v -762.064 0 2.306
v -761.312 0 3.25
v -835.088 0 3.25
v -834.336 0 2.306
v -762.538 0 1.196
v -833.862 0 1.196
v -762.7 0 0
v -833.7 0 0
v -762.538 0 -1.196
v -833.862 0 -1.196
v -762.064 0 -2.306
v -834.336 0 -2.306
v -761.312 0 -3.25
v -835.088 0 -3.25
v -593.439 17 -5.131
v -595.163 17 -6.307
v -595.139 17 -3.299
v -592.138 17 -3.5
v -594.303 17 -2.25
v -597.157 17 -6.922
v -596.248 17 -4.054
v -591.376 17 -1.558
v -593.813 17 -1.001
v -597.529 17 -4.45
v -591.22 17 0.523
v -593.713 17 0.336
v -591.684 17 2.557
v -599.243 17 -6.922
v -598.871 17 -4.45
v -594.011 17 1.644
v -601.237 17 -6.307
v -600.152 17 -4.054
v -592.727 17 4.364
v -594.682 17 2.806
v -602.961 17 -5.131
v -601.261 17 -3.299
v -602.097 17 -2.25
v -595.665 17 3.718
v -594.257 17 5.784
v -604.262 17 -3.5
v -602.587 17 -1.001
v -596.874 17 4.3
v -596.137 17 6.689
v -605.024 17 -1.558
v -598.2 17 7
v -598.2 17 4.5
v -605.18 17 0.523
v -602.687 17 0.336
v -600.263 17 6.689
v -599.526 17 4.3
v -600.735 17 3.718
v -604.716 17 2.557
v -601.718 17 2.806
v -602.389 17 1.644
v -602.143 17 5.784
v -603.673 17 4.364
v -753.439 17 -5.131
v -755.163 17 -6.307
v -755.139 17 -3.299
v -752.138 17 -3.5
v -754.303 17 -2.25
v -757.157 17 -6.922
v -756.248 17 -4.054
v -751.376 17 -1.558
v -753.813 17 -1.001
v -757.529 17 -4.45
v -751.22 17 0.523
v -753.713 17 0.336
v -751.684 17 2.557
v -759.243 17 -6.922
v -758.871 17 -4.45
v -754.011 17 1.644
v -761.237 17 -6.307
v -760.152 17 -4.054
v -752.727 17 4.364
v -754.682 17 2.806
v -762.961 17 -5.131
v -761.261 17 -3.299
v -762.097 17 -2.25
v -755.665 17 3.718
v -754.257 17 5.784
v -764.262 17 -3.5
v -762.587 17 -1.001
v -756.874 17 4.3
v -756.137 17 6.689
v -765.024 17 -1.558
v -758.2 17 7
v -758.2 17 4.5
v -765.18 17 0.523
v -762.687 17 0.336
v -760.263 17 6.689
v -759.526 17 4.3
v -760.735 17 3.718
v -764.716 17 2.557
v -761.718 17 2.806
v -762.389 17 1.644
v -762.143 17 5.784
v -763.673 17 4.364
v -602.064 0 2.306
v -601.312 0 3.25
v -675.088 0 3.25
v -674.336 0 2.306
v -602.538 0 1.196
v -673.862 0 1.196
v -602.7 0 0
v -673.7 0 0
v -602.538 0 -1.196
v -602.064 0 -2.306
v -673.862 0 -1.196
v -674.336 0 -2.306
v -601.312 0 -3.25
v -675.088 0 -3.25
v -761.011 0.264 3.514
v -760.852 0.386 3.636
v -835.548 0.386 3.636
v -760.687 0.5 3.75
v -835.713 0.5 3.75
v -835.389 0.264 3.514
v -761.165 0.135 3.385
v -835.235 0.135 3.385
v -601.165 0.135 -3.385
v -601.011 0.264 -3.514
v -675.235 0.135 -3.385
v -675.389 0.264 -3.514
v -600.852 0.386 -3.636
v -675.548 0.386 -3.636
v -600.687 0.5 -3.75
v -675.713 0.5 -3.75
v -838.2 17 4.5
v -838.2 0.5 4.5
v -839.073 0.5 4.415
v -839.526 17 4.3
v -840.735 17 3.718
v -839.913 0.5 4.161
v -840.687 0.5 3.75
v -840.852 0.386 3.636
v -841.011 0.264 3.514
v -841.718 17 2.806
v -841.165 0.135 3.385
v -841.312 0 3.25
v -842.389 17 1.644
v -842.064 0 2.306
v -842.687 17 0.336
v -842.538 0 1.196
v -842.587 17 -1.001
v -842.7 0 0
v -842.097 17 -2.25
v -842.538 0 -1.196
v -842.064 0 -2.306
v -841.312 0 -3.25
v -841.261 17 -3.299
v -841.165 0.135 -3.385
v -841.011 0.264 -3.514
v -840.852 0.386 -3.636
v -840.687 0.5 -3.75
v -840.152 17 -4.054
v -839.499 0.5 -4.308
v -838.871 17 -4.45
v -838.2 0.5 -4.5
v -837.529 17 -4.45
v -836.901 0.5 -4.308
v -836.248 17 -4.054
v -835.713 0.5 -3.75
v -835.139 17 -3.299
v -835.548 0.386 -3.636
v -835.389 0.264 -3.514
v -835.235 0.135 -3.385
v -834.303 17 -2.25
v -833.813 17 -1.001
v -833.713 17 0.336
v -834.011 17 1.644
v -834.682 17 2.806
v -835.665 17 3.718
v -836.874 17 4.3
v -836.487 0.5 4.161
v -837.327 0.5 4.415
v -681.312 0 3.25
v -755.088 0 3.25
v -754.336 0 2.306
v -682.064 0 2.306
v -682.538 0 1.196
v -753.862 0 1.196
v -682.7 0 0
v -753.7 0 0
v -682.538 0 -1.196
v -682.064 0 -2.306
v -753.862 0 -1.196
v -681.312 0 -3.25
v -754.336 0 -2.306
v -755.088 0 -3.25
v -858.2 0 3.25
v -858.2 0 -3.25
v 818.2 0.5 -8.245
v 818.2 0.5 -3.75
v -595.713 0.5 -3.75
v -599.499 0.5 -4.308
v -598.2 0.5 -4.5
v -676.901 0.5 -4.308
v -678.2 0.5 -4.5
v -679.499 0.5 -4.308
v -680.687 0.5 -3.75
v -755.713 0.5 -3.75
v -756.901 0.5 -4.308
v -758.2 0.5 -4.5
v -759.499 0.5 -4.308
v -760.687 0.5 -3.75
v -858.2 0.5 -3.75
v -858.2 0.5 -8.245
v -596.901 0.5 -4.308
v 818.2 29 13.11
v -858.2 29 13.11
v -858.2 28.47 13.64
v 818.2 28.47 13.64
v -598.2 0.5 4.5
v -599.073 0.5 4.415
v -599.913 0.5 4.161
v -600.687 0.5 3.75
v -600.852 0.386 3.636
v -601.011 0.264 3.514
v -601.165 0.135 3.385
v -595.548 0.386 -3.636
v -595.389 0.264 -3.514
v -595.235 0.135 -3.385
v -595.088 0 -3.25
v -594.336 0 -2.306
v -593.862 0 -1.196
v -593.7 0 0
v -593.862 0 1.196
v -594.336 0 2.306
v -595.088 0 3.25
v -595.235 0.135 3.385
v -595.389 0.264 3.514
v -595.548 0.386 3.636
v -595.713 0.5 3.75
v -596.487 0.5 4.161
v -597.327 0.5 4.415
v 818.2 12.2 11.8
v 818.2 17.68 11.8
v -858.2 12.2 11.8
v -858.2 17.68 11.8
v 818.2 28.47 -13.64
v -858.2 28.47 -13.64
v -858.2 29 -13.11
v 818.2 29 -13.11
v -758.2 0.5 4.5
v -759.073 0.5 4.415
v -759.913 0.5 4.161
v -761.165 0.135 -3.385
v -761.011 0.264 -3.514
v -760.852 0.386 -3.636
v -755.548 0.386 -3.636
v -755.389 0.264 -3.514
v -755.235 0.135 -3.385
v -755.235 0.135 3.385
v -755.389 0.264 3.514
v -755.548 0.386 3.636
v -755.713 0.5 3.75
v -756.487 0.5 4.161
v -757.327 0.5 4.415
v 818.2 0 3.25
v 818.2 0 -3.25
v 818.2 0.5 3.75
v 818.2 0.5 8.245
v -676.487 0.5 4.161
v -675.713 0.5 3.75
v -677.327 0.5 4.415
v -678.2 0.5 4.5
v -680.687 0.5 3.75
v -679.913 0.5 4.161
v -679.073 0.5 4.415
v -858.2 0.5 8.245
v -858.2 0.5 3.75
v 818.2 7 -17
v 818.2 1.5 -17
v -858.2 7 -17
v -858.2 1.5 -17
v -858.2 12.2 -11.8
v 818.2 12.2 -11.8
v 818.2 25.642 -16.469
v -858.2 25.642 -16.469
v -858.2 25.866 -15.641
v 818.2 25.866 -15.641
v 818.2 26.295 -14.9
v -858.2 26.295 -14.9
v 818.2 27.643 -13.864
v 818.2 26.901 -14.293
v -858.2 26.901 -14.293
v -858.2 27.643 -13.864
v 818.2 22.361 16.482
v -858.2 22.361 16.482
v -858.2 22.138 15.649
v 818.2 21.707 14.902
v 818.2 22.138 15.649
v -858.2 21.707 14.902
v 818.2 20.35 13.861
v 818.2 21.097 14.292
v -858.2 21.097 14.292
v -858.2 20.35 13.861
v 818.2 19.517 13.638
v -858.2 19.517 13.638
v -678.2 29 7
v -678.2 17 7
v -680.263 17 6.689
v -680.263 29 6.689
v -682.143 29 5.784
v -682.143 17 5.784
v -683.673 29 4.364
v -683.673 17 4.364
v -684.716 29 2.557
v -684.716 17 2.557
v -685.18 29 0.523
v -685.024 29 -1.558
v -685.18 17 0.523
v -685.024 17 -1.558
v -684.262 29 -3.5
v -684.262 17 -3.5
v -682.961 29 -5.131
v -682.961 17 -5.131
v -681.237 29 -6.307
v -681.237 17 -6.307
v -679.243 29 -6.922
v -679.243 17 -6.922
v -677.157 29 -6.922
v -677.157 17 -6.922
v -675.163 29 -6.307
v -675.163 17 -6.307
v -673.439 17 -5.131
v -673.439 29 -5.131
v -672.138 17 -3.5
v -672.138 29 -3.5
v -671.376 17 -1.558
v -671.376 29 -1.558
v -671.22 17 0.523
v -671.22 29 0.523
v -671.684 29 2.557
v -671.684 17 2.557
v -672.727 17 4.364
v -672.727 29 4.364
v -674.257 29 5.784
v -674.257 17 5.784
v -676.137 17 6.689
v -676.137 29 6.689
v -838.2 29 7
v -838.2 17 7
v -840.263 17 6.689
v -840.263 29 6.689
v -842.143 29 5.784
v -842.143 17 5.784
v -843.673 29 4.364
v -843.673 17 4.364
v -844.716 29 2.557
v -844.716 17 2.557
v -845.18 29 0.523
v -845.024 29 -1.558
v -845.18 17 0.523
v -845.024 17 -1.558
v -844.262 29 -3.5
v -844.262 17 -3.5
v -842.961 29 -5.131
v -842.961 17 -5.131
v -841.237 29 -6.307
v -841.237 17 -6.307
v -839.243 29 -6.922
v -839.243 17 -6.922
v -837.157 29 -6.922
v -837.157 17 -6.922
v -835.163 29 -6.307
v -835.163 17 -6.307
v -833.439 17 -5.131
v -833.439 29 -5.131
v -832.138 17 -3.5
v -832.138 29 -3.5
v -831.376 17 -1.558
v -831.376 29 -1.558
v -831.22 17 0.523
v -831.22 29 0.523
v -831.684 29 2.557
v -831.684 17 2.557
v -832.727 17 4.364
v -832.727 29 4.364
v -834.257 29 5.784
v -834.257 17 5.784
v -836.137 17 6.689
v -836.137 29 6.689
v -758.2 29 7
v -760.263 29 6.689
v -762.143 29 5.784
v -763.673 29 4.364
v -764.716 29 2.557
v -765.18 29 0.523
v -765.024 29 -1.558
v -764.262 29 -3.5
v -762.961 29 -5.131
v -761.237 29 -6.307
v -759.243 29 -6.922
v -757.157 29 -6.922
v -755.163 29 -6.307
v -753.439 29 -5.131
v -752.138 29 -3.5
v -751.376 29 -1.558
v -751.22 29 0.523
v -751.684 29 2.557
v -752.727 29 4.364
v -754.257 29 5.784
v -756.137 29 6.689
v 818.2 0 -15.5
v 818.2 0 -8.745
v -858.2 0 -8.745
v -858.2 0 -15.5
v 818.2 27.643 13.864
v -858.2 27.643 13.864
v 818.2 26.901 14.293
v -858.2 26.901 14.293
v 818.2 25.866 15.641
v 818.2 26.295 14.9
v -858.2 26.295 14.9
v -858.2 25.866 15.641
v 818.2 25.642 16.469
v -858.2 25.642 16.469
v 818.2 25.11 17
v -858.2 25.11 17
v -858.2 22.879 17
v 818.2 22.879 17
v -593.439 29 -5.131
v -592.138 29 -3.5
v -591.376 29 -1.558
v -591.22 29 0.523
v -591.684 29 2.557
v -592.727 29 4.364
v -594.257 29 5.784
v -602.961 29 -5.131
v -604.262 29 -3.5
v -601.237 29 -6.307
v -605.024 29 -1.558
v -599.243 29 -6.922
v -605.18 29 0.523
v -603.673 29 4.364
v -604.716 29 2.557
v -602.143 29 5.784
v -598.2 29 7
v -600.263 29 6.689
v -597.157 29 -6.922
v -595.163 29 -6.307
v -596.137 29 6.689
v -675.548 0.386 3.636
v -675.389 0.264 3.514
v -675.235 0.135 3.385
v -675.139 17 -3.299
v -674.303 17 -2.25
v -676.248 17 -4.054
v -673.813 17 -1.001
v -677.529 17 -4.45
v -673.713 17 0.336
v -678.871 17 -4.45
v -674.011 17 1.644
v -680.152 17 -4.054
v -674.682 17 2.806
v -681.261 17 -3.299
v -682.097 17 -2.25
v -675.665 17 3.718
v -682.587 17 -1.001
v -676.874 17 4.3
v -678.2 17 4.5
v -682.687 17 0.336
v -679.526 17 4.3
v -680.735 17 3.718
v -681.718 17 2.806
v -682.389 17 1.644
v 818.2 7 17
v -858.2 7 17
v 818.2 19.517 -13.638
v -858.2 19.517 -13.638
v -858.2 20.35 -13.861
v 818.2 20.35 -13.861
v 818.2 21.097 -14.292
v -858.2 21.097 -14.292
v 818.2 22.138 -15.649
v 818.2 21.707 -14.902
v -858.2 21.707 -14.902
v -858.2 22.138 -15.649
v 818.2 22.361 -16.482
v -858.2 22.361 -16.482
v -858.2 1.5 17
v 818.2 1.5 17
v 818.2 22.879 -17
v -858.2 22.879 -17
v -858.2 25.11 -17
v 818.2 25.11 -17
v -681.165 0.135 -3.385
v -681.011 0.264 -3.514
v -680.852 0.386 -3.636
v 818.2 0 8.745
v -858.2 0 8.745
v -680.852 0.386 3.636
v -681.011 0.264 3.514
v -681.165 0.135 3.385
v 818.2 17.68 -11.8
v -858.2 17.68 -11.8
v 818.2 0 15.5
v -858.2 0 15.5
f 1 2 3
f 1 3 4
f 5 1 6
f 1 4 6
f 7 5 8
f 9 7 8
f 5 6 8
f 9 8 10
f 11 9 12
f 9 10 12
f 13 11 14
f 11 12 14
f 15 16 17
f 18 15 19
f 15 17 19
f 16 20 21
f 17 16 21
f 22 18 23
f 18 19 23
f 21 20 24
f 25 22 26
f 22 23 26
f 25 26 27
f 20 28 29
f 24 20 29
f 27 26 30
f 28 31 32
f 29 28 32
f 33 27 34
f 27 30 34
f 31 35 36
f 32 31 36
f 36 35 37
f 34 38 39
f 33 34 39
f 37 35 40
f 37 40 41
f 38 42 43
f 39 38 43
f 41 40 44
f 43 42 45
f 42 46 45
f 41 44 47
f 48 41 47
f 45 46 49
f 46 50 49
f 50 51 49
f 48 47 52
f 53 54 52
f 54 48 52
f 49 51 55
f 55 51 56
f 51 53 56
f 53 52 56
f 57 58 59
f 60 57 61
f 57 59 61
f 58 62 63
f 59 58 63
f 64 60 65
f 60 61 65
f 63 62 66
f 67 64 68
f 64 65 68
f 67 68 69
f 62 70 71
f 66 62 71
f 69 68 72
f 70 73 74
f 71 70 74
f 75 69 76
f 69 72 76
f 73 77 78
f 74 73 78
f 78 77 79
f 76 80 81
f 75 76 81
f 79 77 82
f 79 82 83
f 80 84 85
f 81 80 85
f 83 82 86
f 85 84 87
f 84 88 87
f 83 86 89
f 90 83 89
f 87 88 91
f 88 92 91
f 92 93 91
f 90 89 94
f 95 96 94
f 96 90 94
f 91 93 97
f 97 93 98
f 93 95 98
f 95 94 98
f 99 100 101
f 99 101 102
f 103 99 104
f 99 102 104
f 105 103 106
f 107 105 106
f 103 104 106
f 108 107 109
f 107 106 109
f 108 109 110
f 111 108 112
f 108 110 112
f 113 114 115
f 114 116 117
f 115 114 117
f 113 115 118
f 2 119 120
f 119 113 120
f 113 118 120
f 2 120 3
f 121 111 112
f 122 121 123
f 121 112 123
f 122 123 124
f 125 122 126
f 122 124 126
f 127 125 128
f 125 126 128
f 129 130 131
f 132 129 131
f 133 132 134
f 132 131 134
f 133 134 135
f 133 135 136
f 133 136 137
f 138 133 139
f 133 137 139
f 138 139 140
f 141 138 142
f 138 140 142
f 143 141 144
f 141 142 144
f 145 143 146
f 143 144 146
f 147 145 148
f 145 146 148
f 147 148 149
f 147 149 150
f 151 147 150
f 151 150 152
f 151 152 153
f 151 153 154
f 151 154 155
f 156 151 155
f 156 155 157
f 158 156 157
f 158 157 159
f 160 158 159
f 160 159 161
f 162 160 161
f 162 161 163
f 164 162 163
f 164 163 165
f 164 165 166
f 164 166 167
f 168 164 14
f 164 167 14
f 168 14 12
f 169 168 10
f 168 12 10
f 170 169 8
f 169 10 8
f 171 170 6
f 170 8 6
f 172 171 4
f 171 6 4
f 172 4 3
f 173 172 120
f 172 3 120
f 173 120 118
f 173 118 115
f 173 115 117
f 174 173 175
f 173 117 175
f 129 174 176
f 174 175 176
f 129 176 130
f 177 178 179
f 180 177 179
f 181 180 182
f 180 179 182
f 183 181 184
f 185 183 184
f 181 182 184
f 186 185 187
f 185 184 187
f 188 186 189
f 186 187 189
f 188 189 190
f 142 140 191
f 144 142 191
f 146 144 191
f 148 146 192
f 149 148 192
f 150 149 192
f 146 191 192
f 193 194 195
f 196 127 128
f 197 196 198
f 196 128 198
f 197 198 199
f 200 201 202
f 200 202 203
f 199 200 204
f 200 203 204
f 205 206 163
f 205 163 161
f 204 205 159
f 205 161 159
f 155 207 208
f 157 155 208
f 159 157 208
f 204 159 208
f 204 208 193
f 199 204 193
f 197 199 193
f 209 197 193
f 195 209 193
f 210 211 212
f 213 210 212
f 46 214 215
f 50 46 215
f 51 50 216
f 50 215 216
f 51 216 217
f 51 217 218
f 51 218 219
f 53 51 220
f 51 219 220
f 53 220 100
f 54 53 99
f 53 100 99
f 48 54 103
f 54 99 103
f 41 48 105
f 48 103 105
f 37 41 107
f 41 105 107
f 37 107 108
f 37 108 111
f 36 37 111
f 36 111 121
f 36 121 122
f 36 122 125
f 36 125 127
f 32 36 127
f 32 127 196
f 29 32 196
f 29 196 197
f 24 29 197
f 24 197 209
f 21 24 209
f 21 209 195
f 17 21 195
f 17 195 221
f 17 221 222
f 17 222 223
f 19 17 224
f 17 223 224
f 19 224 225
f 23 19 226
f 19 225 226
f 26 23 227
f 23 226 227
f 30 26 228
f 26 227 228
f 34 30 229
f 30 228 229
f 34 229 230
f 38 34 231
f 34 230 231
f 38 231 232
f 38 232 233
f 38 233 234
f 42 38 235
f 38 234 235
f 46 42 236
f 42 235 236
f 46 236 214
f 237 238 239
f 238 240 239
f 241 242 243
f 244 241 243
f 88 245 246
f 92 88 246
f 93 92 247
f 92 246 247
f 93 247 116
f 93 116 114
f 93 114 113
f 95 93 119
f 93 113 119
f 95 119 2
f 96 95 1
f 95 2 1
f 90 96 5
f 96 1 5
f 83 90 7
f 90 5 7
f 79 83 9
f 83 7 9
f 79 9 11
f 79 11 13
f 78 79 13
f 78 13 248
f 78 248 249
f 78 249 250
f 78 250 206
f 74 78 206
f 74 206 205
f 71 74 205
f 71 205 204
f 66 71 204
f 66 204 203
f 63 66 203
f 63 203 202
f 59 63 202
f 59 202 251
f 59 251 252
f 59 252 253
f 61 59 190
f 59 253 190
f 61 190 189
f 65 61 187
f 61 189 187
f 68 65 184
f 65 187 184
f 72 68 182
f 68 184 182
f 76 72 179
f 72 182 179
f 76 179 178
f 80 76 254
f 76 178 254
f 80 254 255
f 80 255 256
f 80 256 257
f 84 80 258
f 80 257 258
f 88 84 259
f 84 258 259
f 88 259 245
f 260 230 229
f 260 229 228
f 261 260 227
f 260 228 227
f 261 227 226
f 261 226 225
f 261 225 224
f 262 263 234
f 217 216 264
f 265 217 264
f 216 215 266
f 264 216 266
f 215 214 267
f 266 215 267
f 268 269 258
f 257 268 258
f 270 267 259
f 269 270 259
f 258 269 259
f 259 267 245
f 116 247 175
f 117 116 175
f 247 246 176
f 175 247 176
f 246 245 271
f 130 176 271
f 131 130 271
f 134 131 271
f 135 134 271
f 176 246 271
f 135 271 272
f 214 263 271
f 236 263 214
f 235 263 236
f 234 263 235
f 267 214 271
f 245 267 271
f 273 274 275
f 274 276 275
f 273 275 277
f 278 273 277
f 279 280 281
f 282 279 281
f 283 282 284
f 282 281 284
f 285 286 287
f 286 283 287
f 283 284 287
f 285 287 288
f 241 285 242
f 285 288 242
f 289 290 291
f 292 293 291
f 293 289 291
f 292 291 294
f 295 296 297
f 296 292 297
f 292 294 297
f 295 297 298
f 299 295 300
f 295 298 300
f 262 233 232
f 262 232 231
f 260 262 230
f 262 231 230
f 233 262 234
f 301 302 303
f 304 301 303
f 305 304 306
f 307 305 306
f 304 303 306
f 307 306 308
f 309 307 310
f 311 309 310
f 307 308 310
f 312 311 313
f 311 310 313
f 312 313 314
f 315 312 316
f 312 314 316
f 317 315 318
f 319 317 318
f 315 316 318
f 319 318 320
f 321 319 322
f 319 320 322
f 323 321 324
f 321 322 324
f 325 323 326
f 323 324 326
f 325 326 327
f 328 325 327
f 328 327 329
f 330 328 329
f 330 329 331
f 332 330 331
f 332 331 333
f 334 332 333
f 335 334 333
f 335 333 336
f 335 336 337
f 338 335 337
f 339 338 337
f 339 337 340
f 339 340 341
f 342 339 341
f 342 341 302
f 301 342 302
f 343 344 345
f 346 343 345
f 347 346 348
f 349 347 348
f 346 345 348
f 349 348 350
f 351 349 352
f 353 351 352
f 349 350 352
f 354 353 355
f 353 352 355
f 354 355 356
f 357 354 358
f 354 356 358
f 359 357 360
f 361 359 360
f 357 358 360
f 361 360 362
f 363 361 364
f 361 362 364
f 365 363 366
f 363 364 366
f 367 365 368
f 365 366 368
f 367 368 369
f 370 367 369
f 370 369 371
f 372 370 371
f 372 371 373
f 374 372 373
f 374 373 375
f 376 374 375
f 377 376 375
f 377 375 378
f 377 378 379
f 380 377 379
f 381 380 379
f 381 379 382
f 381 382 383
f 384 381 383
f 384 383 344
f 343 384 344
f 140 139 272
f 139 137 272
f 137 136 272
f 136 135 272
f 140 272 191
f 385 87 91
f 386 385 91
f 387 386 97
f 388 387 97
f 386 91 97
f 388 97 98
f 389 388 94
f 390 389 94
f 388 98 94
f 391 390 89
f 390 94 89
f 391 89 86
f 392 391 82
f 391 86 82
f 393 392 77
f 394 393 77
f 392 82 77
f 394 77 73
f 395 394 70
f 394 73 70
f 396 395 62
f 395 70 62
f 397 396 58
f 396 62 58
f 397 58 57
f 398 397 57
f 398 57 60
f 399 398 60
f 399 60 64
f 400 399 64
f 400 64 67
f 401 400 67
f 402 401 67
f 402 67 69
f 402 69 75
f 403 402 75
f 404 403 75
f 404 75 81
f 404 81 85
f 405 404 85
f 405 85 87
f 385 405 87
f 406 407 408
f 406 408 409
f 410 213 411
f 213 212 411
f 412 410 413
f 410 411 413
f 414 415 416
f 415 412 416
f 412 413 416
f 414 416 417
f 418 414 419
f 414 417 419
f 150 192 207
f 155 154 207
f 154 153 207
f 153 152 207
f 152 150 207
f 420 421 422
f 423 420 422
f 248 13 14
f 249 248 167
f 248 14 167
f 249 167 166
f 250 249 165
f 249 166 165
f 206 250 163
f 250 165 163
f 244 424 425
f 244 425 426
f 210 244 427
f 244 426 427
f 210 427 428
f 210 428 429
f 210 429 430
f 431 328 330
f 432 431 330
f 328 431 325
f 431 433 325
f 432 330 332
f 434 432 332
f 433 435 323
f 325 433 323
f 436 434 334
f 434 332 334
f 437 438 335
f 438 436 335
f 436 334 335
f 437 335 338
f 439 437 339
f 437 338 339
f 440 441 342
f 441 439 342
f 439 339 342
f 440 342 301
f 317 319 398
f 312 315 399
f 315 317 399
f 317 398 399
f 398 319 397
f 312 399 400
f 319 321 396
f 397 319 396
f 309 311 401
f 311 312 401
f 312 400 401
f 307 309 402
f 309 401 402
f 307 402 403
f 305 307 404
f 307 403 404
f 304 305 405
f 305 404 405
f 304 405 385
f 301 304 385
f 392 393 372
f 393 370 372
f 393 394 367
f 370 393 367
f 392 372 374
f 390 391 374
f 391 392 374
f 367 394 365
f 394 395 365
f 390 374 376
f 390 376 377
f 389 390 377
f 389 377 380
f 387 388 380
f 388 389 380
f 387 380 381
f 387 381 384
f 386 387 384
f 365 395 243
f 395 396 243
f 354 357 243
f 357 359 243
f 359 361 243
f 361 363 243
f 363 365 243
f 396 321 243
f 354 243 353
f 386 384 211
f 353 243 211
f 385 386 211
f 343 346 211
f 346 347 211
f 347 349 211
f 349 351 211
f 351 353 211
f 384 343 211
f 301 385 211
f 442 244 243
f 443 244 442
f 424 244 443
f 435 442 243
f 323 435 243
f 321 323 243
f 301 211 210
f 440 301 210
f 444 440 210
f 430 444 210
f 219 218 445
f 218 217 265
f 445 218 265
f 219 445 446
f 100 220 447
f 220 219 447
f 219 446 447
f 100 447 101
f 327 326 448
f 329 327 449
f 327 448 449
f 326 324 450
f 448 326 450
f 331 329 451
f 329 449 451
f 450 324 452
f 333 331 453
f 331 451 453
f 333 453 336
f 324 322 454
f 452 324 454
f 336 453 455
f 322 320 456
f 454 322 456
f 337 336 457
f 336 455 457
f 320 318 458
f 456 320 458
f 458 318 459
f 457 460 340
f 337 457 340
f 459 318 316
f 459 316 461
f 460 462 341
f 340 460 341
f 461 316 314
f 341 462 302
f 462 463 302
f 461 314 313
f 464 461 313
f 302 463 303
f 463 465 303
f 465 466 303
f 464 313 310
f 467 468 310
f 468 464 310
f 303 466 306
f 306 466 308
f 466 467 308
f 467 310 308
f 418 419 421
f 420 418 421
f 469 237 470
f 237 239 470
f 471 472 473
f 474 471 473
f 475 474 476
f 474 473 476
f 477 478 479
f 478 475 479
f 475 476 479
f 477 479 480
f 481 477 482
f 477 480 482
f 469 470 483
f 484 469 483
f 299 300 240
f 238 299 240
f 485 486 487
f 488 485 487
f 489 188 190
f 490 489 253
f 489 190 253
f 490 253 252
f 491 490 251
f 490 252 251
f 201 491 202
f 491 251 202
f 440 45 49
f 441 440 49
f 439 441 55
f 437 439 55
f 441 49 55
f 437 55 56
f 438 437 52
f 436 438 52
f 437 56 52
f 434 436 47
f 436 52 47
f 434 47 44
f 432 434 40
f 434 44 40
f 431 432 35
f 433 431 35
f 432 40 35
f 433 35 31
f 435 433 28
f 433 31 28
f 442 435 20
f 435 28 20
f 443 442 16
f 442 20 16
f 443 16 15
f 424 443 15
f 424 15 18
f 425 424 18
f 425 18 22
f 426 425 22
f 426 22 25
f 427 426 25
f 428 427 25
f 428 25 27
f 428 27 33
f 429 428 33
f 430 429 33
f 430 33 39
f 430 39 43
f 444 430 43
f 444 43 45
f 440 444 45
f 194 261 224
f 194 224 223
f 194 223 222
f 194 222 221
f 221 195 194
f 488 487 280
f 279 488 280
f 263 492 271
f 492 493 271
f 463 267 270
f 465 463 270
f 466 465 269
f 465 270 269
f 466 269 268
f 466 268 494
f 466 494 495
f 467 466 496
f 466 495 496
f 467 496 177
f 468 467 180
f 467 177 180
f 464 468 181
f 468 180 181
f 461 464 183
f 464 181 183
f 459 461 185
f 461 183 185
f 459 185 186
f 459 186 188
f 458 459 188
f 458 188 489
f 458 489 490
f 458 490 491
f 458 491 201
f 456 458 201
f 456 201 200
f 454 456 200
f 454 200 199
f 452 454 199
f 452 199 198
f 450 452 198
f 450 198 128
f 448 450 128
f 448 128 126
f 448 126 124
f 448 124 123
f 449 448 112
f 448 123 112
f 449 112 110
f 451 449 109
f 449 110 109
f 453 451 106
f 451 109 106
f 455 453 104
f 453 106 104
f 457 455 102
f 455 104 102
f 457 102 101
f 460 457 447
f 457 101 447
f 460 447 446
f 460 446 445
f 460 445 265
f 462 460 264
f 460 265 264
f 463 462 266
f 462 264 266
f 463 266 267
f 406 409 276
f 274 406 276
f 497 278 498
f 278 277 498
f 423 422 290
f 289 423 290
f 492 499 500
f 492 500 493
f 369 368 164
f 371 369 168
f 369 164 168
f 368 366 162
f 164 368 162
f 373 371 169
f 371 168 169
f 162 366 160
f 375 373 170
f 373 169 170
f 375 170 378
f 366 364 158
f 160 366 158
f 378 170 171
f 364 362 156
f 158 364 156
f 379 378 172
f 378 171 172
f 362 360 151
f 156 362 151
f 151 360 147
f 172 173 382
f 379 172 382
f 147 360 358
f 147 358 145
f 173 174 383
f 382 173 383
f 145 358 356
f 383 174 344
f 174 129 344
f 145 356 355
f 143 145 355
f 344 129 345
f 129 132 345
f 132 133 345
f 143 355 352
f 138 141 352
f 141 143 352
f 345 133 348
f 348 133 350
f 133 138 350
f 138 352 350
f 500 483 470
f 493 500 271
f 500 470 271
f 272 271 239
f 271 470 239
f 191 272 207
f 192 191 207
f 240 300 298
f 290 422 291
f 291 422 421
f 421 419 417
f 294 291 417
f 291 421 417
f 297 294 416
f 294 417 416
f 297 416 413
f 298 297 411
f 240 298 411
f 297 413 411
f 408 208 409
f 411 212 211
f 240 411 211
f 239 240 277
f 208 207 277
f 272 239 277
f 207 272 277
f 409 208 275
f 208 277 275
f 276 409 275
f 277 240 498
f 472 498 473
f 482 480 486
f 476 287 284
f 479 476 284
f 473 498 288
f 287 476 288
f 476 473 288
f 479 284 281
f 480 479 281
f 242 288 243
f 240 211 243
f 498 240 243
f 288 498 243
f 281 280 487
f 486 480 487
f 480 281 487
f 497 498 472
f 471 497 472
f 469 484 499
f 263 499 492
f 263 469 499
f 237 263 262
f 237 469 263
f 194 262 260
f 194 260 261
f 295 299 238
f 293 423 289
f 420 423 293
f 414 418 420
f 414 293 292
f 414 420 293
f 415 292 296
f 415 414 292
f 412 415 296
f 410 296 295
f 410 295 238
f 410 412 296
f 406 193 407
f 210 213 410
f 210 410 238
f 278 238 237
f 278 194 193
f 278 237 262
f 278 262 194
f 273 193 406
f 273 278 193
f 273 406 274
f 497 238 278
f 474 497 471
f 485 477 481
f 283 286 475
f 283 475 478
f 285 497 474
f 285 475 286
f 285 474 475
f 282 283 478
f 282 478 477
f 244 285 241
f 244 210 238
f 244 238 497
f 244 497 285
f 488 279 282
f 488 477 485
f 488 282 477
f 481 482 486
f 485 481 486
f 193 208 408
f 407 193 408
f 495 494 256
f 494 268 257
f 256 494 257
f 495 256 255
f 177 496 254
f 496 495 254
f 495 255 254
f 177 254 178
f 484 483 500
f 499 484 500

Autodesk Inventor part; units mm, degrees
sketch "Sketch_18" plane through (-20, 0, 0) normal (1, 0, 0) x (0, 0, -1)
  line L0 (-17, 1.5) -> (-15.5, 0)
  line L1 (-15.5, 0) -> (-8.745, 0)
  line L2 (-8.745, 0) -> (-8.245, 0.5)
  line L3 (-8.245, 0.5) -> (-3.75, 0.5)
  line L4 (-3.75, 0.5) -> (-3.25, 0)
  line L5 (-3.25, 0) -> (3.25, 0)
  line L6 (3.25, 0) -> (3.75, 0.5)
  line L7 (3.75, 0.5) -> (8.245, 0.5)
  line L8 (8.245, 0.5) -> (8.745, 0)
  line L9 (8.745, 0) -> (15.5, 0)
  line L10 (15.5, 0) -> (17, 1.5)
  line L11 (17, 1.5) -> (17, 7.0002)
  line L12 (17, 7.0002) -> (11.8003, 12.1999)
  line L13 (11.8003, 12.1999) -> (11.8003, 17.6796)
  line L14 (11.8003, 17.6796) -> (13.6381, 19.5174)
  arc A0 (16.4816, 22.3609) -> (13.6381, 19.5174) centre (16.9102, 19.0889) ccw
  line L15 (16.4816, 22.3609) -> (17, 22.8793)
  line L16 (17, 22.8793) -> (17, 25.1102)
  line L17 (17, 25.1102) -> (16.4686, 25.6415)
  arc A1 (13.6398, 28.4703) -> (16.4686, 25.6415) centre (16.9102, 28.9119) ccw
  line L18 (13.6398, 28.4703) -> (13.1102, 29)
  line L19 (13.1102, 29) -> (-13.1102, 29)
  line L20 (-13.1102, 29) -> (-13.6398, 28.4703)
  arc A2 (-16.4686, 25.6415) -> (-13.6398, 28.4703) centre (-16.9102, 28.9119) ccw
  line L21 (-16.4686, 25.6415) -> (-17, 25.1102)
  line L22 (-17, 25.1102) -> (-17, 22.8793)
  line L23 (-17, 22.8793) -> (-16.4816, 22.3609)
  arc A3 (-13.6381, 19.5174) -> (-16.4816, 22.3609) centre (-16.9102, 19.0889) ccw
  line L24 (-13.6381, 19.5174) -> (-11.8003, 17.6796)
  line L25 (-11.8003, 17.6796) -> (-11.8003, 12.1999)
  line L26 (-11.8003, 12.1999) -> (-17, 7.0002)
  line L27 (-17, 7.0002) -> (-17, 1.5)
extrude "Extrusion1" add sketch "Sketch_18" along normal mid plane 1676.4
sketch "Sketch2" plane through (-858.2, 29, 13.1102) normal (0, 1, 0) x (1, 0, 0)
  point P0 (20, 13.1102)
hole "Hole1" at (-838.2, 29, 0) direction (0, -1, 0) diameter 9 depth 29 counterbore diameter 14 counterbore depth 12
pattern_linear "Rectangular Pattern1" count 4 spacing 80 along (1, 0, 0) of "Hole1"
ref_plane "4dummy_XY" through (0, 0, 0) normal (1, 0, 0) x (0, 0, -1)
ref_plane "4dummy_YZ" through (0, 0, 0) normal (0, 0, -1) x (0, 1, 0)
ref_plane "4dummy_ZX" through (0, 0, 0) normal (0, 1, 0) x (1, 0, 0)
ref_plane "4slide_XY" through (-20, 7.5, 0) normal (1, 0, 0) x (0, 0, -1)
ref_plane "4slide_YZ" through (-20, 7.5, 0) normal (0, 0, -1) x (0, 1, 0)
ref_plane "4slide_ZX" through (-20, 7.5, 0) normal (0, 1, 0) x (1, 0, 0)
ref_plane "4track_XY" through (0, 0, 0) normal (0, 0, 1) x (1, 0, 0)
ref_plane "4track_YZ" through (0, 0, 0) normal (1, 0, 0) x (0, 1, 0)
ref_plane "4track_ZX" through (0, 0, 0) normal (0, 1, 0) x (0, 0, 1)
properties part number "HSR35R128020 Rail"
